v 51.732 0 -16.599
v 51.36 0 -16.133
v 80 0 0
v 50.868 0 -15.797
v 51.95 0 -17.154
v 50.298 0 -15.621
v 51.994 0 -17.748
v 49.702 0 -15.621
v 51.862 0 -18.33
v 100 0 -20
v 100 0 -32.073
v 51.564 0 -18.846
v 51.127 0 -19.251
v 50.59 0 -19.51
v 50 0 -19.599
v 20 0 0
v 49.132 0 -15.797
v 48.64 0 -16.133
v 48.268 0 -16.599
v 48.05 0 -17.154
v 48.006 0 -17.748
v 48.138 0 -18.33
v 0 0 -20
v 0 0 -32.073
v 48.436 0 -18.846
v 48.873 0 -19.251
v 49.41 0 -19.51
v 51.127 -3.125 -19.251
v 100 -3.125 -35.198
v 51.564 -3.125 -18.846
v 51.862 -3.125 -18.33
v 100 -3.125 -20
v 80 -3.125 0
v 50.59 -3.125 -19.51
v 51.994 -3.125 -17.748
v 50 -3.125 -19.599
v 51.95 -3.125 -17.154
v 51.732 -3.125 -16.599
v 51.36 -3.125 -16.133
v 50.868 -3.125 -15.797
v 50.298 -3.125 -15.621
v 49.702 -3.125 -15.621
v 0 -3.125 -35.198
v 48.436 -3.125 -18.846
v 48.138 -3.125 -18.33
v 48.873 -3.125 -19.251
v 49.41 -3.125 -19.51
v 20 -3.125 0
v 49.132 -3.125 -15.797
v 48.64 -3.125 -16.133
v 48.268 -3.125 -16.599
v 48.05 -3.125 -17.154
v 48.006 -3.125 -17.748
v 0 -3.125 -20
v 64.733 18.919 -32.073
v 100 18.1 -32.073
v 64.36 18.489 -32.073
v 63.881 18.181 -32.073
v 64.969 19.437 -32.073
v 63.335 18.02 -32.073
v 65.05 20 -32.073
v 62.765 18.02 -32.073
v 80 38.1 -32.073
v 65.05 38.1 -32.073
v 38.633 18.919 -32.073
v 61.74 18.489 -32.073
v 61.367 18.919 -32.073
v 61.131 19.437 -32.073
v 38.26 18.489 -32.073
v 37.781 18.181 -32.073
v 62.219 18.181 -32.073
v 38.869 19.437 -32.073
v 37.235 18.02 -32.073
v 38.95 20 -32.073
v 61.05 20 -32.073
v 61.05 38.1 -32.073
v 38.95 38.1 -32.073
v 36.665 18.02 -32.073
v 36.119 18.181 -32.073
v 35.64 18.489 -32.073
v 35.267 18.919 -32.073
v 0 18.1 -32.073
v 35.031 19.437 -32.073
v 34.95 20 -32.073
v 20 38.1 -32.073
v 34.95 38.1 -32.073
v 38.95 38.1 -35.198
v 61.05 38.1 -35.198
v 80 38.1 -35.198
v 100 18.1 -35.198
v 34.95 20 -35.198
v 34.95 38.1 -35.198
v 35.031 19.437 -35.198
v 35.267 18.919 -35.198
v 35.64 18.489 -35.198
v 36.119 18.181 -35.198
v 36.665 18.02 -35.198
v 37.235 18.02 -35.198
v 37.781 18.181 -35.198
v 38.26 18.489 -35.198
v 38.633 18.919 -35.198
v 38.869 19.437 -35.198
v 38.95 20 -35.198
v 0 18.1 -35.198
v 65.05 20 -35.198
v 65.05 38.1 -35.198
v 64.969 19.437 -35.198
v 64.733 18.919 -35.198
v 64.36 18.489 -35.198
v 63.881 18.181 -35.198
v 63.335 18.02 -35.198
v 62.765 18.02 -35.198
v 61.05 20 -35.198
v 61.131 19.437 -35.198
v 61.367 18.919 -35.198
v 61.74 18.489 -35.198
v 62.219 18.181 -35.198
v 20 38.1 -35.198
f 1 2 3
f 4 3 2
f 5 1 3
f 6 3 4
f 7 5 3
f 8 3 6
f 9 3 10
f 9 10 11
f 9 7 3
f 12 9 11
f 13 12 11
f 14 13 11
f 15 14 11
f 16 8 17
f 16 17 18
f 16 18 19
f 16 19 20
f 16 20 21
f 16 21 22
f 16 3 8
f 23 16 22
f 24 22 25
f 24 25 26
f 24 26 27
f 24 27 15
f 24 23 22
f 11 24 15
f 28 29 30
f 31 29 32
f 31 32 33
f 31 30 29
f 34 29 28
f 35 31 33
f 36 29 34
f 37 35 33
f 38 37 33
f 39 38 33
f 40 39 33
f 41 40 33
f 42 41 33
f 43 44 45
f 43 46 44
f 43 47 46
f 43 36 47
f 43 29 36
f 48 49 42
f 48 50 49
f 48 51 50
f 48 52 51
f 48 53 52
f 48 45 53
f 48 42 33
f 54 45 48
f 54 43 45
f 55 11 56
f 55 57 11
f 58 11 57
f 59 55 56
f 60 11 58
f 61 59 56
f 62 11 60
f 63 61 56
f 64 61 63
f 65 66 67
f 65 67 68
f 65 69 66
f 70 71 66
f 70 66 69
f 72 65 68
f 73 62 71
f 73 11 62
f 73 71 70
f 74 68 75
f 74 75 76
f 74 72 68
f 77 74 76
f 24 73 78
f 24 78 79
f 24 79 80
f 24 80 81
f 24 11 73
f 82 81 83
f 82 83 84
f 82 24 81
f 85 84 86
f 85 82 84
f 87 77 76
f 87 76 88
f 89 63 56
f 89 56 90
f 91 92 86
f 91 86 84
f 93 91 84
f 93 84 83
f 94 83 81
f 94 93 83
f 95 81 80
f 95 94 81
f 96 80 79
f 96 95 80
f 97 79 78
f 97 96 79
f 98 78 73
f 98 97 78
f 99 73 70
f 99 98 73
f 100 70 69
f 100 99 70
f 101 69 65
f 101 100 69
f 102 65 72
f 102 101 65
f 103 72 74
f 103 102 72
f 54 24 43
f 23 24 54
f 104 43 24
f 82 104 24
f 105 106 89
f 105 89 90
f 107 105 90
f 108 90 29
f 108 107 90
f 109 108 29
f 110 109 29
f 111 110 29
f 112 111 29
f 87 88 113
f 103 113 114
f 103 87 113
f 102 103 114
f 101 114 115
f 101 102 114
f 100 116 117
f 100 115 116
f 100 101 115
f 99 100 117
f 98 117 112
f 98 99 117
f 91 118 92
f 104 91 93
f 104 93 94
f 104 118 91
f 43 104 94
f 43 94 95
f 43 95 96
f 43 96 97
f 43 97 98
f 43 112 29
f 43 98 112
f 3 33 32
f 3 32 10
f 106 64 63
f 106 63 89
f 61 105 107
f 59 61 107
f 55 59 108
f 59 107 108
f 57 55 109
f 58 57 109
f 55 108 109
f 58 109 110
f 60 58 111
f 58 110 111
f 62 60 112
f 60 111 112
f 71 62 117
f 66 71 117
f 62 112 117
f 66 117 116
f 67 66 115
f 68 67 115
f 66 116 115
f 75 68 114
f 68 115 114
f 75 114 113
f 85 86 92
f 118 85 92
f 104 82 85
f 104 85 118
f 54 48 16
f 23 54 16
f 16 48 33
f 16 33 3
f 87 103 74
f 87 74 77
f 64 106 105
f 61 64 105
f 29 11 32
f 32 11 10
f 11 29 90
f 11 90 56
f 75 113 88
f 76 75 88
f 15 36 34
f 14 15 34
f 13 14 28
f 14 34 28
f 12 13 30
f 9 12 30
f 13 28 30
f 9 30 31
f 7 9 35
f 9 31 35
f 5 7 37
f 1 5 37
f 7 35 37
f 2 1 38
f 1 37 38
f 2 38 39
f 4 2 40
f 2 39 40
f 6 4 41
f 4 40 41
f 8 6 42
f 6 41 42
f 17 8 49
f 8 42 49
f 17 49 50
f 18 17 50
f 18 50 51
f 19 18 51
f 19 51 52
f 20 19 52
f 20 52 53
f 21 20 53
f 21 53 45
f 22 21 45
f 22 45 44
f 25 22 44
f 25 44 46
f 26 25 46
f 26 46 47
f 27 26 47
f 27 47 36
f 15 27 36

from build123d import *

# Parameters (mm, degrees)
EXTRUDE_THIN1_DEPTH = 100
CUT_EXTRUDE1_DEPTH  = 36.197996578
CHAMFER1_SIZE       = 20
CHAMFER2_SIZE       = 20
SKETCH3_R           = 2
CUT_EXTRUDE2_DEPTH  = 42.225


with BuildPart() as part:
    # Sketch1 → Extrude-Thin1 (new body)
    with BuildSketch(Plane(origin=(0, 0, 0), x_dir=(0, 0, -1), z_dir=(1, 0, 0))):
        Polygon((0, 0), (32.072996578, 0), (32.072996578, 38.1), (35.197996578, 38.1), (35.197996578, -3.125), (0, -3.125), align=None)
    extrude(amount=EXTRUDE_THIN1_DEPTH)

    # Sketch2 → Cut-Extrude1 (cut, through all)
    with BuildSketch(Plane(origin=(0, 0, -35.197996578), x_dir=(-1, 0, 0), z_dir=(0, 0, -1))):
        with BuildLine():
            Line((-61.05, 20), (-61.05, 38.1))
            Line((-61.05, 38.1), (-65.05, 38.1))
            Line((-65.05, 38.1), (-65.05, 20))
            ThreePointArc((-65.05, 20), (-63.05, 18), (-61.05, 20))
        make_face()
        with BuildLine():
            Line((-38.95, 20), (-38.95, 38.1))
            Line((-38.95, 38.1), (-34.95, 38.1))
            Line((-34.95, 38.1), (-34.95, 20))
            ThreePointArc((-34.95, 20), (-36.95, 18), (-38.95, 20))
        make_face()
    extrude(amount=-CUT_EXTRUDE1_DEPTH, mode=Mode.SUBTRACT)

    # Chamfer1
    chamfer1_edges = [part.edges().sort_by_distance(p)[0] for p in [
        (0, 38.1, -33.635496578),
        (100, 38.1, -33.635496578),
    ]]
    chamfer(chamfer1_edges, length=CHAMFER1_SIZE)

    # Chamfer2
    chamfer2_edges = [part.edges().sort_by_distance(p)[0] for p in [
        (100, -1.5625, 0),
        (0, -1.5625, 0),
    ]]
    chamfer(chamfer2_edges, length=CHAMFER2_SIZE)

    # Sketch3 → Cut-Extrude2 (cut, through all)
    with BuildSketch(Plane.XZ.offset(3.125)):
        with Locations(Location((50, -17.598998289, 0), (0, 0, 270))):  # turned: the seam where the file's is
            Circle(SKETCH3_R)
    extrude(amount=-CUT_EXTRUDE2_DEPTH, mode=Mode.SUBTRACT)


solid = part.part
